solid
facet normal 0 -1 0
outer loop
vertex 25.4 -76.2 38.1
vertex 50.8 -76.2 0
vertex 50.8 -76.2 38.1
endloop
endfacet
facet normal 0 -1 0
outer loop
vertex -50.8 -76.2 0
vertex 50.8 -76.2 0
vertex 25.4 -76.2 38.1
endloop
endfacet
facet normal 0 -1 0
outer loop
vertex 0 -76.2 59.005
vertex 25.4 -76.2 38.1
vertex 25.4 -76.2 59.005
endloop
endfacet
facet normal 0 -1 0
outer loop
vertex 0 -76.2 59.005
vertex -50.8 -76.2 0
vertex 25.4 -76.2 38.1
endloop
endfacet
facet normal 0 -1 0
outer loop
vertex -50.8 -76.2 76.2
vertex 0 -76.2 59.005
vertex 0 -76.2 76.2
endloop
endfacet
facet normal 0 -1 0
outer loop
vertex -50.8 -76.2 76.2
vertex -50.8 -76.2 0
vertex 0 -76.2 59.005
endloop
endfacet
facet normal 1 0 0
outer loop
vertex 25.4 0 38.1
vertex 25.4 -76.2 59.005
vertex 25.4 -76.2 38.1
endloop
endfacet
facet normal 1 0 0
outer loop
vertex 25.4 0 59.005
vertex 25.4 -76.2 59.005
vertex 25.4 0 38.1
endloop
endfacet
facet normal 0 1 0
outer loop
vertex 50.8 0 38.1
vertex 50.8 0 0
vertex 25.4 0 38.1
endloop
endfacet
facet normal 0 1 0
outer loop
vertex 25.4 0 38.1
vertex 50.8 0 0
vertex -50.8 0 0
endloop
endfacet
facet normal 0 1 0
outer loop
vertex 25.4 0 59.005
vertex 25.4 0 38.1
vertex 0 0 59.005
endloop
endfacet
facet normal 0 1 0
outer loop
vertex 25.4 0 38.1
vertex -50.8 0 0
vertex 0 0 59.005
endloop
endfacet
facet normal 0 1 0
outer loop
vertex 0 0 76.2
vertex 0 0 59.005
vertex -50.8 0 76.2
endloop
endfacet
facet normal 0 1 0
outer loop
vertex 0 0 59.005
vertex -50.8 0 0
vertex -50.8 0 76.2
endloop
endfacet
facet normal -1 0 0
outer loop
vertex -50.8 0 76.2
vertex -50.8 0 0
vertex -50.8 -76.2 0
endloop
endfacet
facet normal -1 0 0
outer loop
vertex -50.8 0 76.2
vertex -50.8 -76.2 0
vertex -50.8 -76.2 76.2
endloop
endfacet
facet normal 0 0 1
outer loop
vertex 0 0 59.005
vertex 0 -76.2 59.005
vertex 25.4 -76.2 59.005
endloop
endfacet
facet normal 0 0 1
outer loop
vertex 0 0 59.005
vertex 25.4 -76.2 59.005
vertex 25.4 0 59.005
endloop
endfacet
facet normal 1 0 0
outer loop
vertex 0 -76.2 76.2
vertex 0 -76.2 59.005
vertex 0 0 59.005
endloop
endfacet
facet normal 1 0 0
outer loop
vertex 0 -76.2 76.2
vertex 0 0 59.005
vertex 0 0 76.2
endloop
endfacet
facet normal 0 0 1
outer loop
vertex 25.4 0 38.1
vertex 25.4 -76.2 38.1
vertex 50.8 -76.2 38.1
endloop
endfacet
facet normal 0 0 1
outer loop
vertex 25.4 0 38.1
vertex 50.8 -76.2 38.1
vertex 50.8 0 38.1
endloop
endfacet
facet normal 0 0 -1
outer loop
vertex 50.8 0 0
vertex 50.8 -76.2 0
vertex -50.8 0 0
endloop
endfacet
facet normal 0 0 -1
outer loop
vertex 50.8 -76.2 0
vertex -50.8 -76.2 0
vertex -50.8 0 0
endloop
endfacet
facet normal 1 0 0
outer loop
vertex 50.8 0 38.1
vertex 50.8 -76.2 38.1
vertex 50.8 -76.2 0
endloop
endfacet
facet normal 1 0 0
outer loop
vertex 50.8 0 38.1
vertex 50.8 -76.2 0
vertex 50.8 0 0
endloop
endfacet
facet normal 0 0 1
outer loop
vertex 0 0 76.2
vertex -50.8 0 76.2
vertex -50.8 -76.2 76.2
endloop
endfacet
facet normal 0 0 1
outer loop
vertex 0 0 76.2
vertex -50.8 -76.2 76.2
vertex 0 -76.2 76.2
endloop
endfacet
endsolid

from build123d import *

# Parameters (mm, degrees)
F0_W     = 50.8
F0_H     = 76.2
F1_DEPTH = 76.2
F2_W     = 76.2
F2_H     = 38.1
F3_DEPTH = 50.8
F4_W     = 76.2
F4_H     = 20.904989
F5_DEPTH = 25.4


with BuildPart() as f1:
    # F0 (on Front) → F1 (new body)
    with BuildSketch(Plane.XZ):
        with Locations((-25.4, 38.1)):
            Rectangle(F0_W, F0_H)
    extrude(amount=F1_DEPTH)

    # F2 (on face) → F3 (join)
    with BuildSketch(Plane.YZ):
        with Locations((-38.1, 19.05)):
            Rectangle(F2_W, F2_H)
    extrude(amount=F3_DEPTH)

    # F4 (on face) → F5 (join)
    with BuildSketch(Plane.YZ):
        with Locations((-38.1, 48.552494)):
            Rectangle(F4_W, F4_H)
    extrude(amount=F5_DEPTH)


solid = f1.part
